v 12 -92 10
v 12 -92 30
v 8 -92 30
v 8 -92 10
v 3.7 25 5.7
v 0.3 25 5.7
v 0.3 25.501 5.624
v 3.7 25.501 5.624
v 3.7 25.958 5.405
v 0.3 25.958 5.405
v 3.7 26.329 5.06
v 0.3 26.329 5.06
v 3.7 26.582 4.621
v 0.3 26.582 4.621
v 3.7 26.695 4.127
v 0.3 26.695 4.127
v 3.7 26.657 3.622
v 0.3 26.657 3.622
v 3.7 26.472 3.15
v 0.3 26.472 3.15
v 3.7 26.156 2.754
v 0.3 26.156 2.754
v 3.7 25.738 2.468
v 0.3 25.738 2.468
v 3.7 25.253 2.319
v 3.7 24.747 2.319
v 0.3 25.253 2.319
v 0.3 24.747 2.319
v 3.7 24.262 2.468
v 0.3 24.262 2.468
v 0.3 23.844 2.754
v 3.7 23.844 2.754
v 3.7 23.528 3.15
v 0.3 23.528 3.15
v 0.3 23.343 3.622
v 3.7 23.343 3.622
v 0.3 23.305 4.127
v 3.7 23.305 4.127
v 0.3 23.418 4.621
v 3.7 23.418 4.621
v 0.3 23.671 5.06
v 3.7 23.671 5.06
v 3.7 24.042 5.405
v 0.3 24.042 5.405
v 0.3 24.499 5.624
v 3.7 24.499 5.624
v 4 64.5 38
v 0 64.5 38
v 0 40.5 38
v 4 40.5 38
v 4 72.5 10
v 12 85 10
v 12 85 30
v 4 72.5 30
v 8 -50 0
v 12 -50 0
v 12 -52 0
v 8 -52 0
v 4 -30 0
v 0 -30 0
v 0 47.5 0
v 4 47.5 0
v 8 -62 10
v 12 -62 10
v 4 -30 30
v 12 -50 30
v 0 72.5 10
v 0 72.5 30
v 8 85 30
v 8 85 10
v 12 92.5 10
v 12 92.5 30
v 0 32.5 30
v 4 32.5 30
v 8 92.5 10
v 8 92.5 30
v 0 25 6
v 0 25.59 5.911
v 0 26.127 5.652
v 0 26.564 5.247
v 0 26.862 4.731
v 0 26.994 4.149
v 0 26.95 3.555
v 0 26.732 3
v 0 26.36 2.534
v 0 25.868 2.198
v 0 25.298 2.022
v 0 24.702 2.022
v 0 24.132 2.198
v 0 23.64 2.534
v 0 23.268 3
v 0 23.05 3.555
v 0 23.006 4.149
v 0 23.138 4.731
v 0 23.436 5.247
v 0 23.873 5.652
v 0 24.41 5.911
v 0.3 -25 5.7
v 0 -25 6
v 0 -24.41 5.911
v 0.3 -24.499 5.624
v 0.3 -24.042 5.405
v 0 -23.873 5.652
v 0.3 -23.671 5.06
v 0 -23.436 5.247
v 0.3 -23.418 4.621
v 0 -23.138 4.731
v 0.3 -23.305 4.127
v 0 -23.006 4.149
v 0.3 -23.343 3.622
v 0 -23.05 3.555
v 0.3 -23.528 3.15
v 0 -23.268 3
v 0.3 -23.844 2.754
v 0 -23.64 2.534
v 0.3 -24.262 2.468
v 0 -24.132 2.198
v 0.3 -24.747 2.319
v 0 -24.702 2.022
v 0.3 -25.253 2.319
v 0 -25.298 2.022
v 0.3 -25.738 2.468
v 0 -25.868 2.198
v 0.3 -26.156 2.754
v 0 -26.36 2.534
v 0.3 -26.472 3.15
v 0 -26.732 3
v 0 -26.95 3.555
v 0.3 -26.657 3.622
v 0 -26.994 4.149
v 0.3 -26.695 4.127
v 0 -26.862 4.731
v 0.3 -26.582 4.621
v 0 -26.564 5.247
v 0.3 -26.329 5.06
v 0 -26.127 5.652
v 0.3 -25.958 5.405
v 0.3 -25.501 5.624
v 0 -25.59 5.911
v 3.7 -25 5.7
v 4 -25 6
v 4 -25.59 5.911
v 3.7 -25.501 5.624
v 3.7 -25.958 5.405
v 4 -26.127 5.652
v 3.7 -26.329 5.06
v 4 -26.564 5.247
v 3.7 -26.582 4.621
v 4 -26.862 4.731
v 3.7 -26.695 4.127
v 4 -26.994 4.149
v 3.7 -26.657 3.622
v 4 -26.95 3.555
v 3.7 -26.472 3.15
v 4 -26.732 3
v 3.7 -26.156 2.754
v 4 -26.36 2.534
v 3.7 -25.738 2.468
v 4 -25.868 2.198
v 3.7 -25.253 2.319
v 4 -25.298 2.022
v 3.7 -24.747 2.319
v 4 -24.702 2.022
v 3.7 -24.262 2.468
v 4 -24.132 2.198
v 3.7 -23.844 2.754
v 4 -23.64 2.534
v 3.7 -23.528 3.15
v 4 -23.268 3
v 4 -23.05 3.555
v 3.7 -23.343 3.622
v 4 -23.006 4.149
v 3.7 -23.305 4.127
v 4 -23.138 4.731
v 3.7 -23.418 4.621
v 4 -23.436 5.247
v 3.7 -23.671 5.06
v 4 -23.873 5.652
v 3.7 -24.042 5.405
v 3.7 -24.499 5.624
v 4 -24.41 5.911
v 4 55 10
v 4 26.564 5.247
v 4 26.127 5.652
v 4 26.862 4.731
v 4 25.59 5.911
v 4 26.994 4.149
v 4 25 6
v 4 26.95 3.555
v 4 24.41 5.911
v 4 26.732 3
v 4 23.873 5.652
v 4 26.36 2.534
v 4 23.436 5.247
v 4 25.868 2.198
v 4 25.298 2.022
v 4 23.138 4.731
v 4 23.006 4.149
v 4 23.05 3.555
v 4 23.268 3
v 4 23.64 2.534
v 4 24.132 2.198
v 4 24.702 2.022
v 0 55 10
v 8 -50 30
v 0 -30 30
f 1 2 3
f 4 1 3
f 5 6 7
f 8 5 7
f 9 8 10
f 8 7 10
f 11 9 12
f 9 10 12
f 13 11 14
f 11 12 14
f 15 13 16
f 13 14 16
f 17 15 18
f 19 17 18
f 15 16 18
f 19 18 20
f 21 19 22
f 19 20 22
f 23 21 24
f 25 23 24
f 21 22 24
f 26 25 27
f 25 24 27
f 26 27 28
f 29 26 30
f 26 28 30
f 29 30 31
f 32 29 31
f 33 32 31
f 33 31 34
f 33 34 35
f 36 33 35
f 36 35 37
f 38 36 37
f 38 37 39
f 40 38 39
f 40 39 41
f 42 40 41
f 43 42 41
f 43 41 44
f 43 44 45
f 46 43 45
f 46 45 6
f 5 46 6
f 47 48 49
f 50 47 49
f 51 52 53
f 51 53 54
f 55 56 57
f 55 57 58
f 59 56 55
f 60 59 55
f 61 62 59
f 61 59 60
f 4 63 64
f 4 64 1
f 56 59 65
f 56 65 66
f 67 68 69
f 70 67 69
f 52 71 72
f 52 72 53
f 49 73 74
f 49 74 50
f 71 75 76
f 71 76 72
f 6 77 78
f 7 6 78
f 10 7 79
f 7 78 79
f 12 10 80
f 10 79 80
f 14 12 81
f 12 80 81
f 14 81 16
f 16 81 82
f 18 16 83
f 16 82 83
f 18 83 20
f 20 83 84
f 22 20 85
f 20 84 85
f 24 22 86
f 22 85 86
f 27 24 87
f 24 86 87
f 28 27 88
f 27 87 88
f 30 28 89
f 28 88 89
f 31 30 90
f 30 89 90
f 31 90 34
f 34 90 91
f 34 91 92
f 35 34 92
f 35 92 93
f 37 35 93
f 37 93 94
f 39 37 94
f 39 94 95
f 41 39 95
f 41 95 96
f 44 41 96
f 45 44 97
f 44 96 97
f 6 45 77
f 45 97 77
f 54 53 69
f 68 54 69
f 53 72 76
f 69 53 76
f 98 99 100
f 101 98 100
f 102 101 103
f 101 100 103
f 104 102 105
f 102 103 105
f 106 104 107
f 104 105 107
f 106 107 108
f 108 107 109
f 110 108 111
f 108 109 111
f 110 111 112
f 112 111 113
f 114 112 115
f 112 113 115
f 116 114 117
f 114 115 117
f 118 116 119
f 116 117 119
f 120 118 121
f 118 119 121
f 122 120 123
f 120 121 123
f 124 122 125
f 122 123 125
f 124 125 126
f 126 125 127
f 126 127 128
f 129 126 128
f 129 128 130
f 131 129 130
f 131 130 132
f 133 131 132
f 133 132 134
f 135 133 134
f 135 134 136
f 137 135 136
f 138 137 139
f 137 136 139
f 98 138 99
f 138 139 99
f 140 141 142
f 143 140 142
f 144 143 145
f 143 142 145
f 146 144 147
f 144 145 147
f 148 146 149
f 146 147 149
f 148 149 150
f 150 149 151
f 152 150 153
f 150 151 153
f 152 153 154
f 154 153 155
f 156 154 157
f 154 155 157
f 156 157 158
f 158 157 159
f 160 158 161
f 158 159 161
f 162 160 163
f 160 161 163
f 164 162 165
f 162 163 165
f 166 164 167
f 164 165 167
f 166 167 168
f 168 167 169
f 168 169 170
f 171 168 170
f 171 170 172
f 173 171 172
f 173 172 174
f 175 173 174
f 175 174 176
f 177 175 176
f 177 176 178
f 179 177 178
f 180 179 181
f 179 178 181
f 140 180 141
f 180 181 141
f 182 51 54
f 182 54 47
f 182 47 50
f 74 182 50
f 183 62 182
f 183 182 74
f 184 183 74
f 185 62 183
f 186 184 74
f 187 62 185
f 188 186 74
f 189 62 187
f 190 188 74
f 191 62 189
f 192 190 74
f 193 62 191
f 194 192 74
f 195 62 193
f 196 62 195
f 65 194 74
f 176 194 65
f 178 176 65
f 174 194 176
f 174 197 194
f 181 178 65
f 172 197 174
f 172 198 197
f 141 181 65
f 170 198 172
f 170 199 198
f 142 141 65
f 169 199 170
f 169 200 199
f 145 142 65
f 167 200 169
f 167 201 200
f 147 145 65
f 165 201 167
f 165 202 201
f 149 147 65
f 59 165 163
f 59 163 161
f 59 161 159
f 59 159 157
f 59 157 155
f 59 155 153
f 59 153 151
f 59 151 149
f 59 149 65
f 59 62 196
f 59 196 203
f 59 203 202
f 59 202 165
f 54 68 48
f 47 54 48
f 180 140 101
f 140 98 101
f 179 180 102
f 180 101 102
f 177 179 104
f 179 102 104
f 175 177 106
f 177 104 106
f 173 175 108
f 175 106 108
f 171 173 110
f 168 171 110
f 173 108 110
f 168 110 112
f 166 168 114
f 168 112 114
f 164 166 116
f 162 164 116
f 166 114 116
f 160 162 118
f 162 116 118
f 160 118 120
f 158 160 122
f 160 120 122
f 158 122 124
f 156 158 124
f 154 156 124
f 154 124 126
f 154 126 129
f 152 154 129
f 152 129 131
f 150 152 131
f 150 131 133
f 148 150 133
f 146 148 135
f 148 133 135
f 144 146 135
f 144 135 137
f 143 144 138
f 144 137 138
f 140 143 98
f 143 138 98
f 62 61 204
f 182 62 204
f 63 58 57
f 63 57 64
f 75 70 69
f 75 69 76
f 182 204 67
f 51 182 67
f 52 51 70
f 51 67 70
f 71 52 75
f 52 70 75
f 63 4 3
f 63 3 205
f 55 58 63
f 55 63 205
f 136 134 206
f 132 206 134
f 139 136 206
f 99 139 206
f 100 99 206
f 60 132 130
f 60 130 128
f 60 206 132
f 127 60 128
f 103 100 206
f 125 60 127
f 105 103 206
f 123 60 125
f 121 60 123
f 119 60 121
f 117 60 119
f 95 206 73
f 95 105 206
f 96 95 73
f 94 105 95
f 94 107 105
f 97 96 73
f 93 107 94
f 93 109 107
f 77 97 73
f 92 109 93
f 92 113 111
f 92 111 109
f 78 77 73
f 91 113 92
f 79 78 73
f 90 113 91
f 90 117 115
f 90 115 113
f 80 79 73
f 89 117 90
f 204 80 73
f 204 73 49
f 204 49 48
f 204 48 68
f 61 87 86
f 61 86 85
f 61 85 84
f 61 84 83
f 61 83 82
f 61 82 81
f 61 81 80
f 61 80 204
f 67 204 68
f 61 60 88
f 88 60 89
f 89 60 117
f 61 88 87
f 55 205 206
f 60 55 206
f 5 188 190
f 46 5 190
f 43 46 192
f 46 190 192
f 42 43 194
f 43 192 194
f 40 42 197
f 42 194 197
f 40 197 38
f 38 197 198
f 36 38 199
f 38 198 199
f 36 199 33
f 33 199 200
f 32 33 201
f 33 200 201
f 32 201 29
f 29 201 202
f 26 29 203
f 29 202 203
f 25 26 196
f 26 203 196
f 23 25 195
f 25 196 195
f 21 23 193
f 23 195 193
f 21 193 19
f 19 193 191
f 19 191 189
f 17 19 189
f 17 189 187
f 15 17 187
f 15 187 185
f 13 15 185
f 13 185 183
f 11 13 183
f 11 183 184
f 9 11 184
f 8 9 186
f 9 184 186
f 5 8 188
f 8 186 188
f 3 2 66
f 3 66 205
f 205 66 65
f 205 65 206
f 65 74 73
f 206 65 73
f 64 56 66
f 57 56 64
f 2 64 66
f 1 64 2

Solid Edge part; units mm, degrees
sketch "Sketch1" plane through (0, 0, 0) normal (0, 0, 1) x (1, 0, 0)
  line L0 (0, 72.5) -> (8, 85)
  line L1 (8, 85) -> (12, 85)
  line L2 (12, 85) -> (4, 72.5)
  line L3 (4, 72.5) -> (4, -30)
  line L4 (4, -30) -> (12, -50)
  line L5 (12, -50) -> (12, -92)
  line L6 (12, -92) -> (8, -92)
  line L7 (8, -92) -> (8, -50)
  line L8 (8, -50) -> (0, -30)
  line L9 (0, -30) -> (0, 72.5)
  dimension "D1" = 85
  dimension "D2" = 12.5
  dimension "D3" = 4
  dimension "D4" = 102.5
  dimension "D5" = 20
  dimension "D6" = 42
  dimension "D7" = 8
  dimension "D8" = 8
extrude "Protrusion1" add sketch "Sketch1" along normal blind 30
hole "Hole1" at (0, 25, 4) direction (1, 0, 0) diameter 3.4 end up to next start chamfer 0.3 start chamfer angle 45 end chamfer 0.3 end chamfer angle 45
hole "Hole2" at (0, -25, 4) direction (1, 0, 0) diameter 3.4 end up to next start chamfer 0.3 start chamfer angle 45 end chamfer 0.3 end chamfer angle 45
sketch "Sketch2" plane through (0, 0, 0) normal (1, 0, 0) x (0, 1, 0)
  line L0 (47.5, 0) -> (55, 10)
  line L1 (55, 10) -> (85, 10)
  line L2 (85, 10) -> (85, 0)
  line L3 (85, 0) -> (47.5, 0)
  dimension "D1" = 10
  dimension "D2" = 37.5
  dimension "D3" = 30
extrude "front_bearing_cutout" cut sketch "Sketch2" along normal blind 46.5167
sketch "Sketch3" plane through (8, -71, 15) normal (-1, 0, 0) x (0, -1, 0)
  line L0 (-19, -15) -> (-9, -5)
  line L1 (-9, -5) -> (21, -5)
  line L2 (21, -5) -> (21, -15)
  line L3 (21, -15) -> (-19, -15)
  dimension "D1" = 40
  dimension "D2" = 10
  dimension "D3" = 30
extrude "Cutout1" cut sketch "Sketch3" against normal up to next
sketch "Sketch4" plane through (6, -2.25, 30) normal (0, 0, 1) x (0, -1, 0)
  line L0 (-87.25, 6) -> (-87.25, 2)
  line L1 (-87.25, 2) -> (-94.75, 2)
  line L2 (-94.75, 2) -> (-94.75, 6)
  line L3 (-94.75, 6) -> (-87.25, 6)
  dimension "D1" = 7.5
extrude "Protrusion2" add sketch "Sketch4" against normal up to vertex (20 mm away)
sketch "Sketch5" plane through (0, 21.25, 15) normal (-1, 0, 0) x (0, -1, 0)
  line L0 (-51.25, 15) -> (-43.25, 23)
  line L1 (-43.25, 23) -> (-19.25, 23)
  line L2 (-11.25, 15) -> (-19.25, 23)
  line L3 (-51.25, 15) -> (-11.25, 15)
  dimension "D1" = 8
  dimension "D2" = 40
  dimension "D3" = 24
extrude "Protrusion3" add sketch "Sketch5" against normal up to vertex (4 mm away)
properties material "Polyethylene, low density"
